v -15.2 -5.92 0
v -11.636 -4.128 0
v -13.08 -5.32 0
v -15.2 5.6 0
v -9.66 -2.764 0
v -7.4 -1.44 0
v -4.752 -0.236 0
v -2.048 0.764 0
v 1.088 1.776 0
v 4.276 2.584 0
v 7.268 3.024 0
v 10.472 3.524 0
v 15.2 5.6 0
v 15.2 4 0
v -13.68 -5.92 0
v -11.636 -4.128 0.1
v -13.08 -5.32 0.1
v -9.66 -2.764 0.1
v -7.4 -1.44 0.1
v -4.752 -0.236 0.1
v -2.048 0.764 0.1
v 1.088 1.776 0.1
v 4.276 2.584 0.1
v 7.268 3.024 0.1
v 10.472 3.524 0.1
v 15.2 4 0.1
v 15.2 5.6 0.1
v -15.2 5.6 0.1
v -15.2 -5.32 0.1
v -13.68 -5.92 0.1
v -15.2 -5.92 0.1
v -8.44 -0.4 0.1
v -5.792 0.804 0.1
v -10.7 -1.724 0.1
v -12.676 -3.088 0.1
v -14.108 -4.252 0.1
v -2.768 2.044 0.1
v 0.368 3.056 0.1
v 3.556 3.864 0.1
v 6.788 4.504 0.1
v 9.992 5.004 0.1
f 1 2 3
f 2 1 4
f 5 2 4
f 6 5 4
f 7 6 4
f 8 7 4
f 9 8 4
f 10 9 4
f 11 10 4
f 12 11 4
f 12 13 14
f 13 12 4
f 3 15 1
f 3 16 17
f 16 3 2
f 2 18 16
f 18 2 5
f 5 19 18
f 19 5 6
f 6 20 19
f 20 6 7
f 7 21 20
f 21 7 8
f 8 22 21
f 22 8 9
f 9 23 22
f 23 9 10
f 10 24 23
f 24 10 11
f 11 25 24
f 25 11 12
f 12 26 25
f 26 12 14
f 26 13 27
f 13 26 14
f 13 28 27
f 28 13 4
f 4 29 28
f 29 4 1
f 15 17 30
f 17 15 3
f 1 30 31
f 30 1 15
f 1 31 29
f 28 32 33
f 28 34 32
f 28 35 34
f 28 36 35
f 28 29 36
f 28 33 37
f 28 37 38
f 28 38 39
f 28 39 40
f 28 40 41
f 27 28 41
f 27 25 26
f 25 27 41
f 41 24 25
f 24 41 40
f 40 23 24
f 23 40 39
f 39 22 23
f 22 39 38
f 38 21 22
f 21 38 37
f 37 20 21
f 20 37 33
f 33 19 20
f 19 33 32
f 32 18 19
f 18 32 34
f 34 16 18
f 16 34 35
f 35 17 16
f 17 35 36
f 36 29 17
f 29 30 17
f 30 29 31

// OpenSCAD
use <../lib.scad>
use <6153754c.scad>
function ldraw_lib__6153754d() = [
// 0 Sticker  1.5 x  3.8 with Dark Azure Volkswagen Right Side Window Shape
// 0 Name: 6153754d.dat
// 0 Author: Magnus Forsberg [MagFors]
// 0 !LDRAW_ORG Part UPDATE 2016-01
// 0 !LICENSE Licensed under CC BY 4.0 : see CAreadme.txt
// 
// 0 BFC CERTIFY CCW
  [0,"BFC","CERTIFY"],
  [0,"BFC","CCW"],
// 
// 0 !KEYWORDS Beetle, set 10252, VW
// 
// 0 !HISTORY 2016-12-31 [PTadmin] Official Update 2016-01
// 
// 
// 1 16 0 0 0 -1 0 0 0 1 0 0 0 1 6153754c.dat
  [1,16,0,0,0,-1,0,0,0,1,0,0,0,1, ldraw_lib__6153754c()],
];
module ldraw_lib__6153754d(step=0, col=false, unit=2/5, alt=false, line=0.2, solid=!$preview)
    makepoly(ldraw_lib__6153754d(), step=step, col=col, unit=unit, alt=alt, line=line, solid=solid);
ldraw_lib__6153754d(line=0.2);
